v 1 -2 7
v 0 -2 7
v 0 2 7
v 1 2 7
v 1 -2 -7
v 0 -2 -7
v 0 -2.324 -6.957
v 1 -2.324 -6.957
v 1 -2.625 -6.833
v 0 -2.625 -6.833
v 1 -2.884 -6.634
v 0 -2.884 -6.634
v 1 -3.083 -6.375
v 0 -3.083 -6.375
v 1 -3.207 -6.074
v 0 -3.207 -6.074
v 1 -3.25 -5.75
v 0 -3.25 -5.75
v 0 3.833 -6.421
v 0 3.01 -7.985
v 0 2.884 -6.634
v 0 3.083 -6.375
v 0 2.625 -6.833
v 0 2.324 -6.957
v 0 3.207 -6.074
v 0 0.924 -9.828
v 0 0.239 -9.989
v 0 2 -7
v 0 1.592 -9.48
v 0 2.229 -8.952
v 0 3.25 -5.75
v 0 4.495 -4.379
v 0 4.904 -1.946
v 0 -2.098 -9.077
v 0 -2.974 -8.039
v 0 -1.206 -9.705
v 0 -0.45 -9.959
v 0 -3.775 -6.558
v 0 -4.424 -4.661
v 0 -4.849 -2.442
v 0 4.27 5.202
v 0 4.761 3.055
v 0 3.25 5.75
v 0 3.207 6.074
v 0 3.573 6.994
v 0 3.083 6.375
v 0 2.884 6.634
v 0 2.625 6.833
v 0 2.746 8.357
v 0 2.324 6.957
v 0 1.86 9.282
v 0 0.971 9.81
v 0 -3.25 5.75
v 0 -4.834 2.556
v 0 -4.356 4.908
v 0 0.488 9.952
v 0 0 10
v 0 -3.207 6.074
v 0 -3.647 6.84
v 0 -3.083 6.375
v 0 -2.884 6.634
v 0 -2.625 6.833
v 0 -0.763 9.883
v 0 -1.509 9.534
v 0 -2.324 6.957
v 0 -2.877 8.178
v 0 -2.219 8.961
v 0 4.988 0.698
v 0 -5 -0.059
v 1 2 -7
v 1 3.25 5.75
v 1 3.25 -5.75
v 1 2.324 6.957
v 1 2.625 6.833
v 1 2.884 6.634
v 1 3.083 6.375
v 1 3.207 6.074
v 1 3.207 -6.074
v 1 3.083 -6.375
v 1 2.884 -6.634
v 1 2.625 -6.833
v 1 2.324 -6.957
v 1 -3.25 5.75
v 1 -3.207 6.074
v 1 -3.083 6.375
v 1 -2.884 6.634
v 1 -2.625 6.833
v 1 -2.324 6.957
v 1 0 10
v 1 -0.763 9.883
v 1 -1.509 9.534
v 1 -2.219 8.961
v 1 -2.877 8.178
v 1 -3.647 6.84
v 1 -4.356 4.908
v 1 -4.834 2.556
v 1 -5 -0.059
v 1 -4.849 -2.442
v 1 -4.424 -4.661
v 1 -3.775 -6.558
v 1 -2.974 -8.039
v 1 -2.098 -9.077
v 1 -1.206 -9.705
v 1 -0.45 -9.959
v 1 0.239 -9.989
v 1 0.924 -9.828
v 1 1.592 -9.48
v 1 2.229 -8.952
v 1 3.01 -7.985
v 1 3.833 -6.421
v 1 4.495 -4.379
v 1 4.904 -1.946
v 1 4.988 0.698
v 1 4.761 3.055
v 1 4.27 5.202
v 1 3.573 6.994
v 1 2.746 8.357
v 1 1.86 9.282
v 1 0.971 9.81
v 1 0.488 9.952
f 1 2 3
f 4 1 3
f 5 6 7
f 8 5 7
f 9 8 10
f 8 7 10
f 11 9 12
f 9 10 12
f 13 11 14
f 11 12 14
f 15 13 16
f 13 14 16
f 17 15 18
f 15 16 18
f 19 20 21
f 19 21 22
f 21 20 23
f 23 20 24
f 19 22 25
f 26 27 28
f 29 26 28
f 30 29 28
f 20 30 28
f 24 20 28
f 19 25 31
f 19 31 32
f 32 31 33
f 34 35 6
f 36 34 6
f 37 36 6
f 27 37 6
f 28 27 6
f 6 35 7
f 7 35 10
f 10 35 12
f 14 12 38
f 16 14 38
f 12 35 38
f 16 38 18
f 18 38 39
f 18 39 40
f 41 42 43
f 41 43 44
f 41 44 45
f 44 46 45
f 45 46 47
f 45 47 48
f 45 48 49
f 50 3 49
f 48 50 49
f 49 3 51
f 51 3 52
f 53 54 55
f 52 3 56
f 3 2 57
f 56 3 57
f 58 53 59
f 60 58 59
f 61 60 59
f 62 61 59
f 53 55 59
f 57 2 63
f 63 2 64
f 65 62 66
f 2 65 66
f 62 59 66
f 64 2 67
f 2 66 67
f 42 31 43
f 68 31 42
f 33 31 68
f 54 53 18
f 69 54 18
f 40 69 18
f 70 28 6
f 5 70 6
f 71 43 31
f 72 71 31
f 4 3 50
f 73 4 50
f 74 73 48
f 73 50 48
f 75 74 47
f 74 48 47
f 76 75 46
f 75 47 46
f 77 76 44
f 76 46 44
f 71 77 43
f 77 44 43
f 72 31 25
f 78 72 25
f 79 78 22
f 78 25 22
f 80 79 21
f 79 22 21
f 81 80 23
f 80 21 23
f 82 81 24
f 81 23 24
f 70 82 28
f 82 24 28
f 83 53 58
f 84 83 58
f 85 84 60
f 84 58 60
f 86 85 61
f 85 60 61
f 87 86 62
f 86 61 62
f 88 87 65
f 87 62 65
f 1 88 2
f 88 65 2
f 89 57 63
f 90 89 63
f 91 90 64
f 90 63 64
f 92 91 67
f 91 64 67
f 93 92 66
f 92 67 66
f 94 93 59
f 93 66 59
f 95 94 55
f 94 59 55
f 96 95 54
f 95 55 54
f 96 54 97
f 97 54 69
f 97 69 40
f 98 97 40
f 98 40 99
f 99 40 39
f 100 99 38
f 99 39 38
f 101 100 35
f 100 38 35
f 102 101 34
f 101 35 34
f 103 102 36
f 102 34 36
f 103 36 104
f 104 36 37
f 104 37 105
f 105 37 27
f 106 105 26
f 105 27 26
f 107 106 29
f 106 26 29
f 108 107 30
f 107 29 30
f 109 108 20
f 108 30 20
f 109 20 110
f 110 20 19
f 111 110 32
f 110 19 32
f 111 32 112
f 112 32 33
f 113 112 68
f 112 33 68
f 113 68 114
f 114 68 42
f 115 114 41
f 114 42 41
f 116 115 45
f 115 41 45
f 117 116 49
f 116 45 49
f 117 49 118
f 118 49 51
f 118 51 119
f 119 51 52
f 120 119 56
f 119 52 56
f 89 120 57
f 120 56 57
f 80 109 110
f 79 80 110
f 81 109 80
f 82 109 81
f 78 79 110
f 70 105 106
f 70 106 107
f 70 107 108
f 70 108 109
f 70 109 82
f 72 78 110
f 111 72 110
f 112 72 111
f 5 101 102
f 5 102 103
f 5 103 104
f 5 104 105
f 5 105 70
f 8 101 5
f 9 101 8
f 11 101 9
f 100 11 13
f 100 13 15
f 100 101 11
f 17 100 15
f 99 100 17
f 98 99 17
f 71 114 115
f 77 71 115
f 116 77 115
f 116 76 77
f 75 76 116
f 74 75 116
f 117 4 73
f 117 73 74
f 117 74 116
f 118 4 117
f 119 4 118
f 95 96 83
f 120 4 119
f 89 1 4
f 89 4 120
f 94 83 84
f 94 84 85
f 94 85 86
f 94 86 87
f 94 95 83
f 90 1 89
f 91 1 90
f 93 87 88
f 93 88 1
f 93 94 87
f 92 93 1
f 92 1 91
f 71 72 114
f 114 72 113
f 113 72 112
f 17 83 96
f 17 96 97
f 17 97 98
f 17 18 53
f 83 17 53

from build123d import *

# Parameters (mm, degrees)
OUTER_SKETCH_RX   = 10
OUTER_SKETCH_RY   = 5
LED_BODY_DEPTH    = 1
LED_SURFACE_DEPTH = 2


with BuildPart() as part:
    # Outer_sketch → LED_body (new body)
    with BuildSketch(Plane(origin=(0, 0, 0), x_dir=(0, 0, -1), z_dir=(1, 0, 0))):
        with Locations(Location((0, 0), (0, 0, 180))):
            Ellipse(OUTER_SKETCH_RX, OUTER_SKETCH_RY)
    extrude(amount=LED_BODY_DEPTH)

    # Hole_sketch → LED_surface (cut, through all)
    with BuildSketch(Plane(origin=(0, 0, 0), x_dir=(0, 0, -1), z_dir=(1, 0, 0))):
        with BuildLine():
            Line((-7, -2), (-7, 2))
            ThreePointArc((-7, 2), (-6.633883476, 2.883883476), (-5.75, 3.25))
            Line((-5.75, 3.25), (5.75, 3.25))
            ThreePointArc((5.75, 3.25), (6.633883476, 2.883883476), (7, 2))
            Line((7, 2), (7, -2))
            ThreePointArc((7, -2), (6.633883476, -2.883883476), (5.75, -3.25))
            Line((5.75, -3.25), (-5.75, -3.25))
            ThreePointArc((-5.75, -3.25), (-6.633883476, -2.883883476), (-7, -2))
        make_face()
    extrude(amount=LED_SURFACE_DEPTH, mode=Mode.SUBTRACT)


solid = part.part
